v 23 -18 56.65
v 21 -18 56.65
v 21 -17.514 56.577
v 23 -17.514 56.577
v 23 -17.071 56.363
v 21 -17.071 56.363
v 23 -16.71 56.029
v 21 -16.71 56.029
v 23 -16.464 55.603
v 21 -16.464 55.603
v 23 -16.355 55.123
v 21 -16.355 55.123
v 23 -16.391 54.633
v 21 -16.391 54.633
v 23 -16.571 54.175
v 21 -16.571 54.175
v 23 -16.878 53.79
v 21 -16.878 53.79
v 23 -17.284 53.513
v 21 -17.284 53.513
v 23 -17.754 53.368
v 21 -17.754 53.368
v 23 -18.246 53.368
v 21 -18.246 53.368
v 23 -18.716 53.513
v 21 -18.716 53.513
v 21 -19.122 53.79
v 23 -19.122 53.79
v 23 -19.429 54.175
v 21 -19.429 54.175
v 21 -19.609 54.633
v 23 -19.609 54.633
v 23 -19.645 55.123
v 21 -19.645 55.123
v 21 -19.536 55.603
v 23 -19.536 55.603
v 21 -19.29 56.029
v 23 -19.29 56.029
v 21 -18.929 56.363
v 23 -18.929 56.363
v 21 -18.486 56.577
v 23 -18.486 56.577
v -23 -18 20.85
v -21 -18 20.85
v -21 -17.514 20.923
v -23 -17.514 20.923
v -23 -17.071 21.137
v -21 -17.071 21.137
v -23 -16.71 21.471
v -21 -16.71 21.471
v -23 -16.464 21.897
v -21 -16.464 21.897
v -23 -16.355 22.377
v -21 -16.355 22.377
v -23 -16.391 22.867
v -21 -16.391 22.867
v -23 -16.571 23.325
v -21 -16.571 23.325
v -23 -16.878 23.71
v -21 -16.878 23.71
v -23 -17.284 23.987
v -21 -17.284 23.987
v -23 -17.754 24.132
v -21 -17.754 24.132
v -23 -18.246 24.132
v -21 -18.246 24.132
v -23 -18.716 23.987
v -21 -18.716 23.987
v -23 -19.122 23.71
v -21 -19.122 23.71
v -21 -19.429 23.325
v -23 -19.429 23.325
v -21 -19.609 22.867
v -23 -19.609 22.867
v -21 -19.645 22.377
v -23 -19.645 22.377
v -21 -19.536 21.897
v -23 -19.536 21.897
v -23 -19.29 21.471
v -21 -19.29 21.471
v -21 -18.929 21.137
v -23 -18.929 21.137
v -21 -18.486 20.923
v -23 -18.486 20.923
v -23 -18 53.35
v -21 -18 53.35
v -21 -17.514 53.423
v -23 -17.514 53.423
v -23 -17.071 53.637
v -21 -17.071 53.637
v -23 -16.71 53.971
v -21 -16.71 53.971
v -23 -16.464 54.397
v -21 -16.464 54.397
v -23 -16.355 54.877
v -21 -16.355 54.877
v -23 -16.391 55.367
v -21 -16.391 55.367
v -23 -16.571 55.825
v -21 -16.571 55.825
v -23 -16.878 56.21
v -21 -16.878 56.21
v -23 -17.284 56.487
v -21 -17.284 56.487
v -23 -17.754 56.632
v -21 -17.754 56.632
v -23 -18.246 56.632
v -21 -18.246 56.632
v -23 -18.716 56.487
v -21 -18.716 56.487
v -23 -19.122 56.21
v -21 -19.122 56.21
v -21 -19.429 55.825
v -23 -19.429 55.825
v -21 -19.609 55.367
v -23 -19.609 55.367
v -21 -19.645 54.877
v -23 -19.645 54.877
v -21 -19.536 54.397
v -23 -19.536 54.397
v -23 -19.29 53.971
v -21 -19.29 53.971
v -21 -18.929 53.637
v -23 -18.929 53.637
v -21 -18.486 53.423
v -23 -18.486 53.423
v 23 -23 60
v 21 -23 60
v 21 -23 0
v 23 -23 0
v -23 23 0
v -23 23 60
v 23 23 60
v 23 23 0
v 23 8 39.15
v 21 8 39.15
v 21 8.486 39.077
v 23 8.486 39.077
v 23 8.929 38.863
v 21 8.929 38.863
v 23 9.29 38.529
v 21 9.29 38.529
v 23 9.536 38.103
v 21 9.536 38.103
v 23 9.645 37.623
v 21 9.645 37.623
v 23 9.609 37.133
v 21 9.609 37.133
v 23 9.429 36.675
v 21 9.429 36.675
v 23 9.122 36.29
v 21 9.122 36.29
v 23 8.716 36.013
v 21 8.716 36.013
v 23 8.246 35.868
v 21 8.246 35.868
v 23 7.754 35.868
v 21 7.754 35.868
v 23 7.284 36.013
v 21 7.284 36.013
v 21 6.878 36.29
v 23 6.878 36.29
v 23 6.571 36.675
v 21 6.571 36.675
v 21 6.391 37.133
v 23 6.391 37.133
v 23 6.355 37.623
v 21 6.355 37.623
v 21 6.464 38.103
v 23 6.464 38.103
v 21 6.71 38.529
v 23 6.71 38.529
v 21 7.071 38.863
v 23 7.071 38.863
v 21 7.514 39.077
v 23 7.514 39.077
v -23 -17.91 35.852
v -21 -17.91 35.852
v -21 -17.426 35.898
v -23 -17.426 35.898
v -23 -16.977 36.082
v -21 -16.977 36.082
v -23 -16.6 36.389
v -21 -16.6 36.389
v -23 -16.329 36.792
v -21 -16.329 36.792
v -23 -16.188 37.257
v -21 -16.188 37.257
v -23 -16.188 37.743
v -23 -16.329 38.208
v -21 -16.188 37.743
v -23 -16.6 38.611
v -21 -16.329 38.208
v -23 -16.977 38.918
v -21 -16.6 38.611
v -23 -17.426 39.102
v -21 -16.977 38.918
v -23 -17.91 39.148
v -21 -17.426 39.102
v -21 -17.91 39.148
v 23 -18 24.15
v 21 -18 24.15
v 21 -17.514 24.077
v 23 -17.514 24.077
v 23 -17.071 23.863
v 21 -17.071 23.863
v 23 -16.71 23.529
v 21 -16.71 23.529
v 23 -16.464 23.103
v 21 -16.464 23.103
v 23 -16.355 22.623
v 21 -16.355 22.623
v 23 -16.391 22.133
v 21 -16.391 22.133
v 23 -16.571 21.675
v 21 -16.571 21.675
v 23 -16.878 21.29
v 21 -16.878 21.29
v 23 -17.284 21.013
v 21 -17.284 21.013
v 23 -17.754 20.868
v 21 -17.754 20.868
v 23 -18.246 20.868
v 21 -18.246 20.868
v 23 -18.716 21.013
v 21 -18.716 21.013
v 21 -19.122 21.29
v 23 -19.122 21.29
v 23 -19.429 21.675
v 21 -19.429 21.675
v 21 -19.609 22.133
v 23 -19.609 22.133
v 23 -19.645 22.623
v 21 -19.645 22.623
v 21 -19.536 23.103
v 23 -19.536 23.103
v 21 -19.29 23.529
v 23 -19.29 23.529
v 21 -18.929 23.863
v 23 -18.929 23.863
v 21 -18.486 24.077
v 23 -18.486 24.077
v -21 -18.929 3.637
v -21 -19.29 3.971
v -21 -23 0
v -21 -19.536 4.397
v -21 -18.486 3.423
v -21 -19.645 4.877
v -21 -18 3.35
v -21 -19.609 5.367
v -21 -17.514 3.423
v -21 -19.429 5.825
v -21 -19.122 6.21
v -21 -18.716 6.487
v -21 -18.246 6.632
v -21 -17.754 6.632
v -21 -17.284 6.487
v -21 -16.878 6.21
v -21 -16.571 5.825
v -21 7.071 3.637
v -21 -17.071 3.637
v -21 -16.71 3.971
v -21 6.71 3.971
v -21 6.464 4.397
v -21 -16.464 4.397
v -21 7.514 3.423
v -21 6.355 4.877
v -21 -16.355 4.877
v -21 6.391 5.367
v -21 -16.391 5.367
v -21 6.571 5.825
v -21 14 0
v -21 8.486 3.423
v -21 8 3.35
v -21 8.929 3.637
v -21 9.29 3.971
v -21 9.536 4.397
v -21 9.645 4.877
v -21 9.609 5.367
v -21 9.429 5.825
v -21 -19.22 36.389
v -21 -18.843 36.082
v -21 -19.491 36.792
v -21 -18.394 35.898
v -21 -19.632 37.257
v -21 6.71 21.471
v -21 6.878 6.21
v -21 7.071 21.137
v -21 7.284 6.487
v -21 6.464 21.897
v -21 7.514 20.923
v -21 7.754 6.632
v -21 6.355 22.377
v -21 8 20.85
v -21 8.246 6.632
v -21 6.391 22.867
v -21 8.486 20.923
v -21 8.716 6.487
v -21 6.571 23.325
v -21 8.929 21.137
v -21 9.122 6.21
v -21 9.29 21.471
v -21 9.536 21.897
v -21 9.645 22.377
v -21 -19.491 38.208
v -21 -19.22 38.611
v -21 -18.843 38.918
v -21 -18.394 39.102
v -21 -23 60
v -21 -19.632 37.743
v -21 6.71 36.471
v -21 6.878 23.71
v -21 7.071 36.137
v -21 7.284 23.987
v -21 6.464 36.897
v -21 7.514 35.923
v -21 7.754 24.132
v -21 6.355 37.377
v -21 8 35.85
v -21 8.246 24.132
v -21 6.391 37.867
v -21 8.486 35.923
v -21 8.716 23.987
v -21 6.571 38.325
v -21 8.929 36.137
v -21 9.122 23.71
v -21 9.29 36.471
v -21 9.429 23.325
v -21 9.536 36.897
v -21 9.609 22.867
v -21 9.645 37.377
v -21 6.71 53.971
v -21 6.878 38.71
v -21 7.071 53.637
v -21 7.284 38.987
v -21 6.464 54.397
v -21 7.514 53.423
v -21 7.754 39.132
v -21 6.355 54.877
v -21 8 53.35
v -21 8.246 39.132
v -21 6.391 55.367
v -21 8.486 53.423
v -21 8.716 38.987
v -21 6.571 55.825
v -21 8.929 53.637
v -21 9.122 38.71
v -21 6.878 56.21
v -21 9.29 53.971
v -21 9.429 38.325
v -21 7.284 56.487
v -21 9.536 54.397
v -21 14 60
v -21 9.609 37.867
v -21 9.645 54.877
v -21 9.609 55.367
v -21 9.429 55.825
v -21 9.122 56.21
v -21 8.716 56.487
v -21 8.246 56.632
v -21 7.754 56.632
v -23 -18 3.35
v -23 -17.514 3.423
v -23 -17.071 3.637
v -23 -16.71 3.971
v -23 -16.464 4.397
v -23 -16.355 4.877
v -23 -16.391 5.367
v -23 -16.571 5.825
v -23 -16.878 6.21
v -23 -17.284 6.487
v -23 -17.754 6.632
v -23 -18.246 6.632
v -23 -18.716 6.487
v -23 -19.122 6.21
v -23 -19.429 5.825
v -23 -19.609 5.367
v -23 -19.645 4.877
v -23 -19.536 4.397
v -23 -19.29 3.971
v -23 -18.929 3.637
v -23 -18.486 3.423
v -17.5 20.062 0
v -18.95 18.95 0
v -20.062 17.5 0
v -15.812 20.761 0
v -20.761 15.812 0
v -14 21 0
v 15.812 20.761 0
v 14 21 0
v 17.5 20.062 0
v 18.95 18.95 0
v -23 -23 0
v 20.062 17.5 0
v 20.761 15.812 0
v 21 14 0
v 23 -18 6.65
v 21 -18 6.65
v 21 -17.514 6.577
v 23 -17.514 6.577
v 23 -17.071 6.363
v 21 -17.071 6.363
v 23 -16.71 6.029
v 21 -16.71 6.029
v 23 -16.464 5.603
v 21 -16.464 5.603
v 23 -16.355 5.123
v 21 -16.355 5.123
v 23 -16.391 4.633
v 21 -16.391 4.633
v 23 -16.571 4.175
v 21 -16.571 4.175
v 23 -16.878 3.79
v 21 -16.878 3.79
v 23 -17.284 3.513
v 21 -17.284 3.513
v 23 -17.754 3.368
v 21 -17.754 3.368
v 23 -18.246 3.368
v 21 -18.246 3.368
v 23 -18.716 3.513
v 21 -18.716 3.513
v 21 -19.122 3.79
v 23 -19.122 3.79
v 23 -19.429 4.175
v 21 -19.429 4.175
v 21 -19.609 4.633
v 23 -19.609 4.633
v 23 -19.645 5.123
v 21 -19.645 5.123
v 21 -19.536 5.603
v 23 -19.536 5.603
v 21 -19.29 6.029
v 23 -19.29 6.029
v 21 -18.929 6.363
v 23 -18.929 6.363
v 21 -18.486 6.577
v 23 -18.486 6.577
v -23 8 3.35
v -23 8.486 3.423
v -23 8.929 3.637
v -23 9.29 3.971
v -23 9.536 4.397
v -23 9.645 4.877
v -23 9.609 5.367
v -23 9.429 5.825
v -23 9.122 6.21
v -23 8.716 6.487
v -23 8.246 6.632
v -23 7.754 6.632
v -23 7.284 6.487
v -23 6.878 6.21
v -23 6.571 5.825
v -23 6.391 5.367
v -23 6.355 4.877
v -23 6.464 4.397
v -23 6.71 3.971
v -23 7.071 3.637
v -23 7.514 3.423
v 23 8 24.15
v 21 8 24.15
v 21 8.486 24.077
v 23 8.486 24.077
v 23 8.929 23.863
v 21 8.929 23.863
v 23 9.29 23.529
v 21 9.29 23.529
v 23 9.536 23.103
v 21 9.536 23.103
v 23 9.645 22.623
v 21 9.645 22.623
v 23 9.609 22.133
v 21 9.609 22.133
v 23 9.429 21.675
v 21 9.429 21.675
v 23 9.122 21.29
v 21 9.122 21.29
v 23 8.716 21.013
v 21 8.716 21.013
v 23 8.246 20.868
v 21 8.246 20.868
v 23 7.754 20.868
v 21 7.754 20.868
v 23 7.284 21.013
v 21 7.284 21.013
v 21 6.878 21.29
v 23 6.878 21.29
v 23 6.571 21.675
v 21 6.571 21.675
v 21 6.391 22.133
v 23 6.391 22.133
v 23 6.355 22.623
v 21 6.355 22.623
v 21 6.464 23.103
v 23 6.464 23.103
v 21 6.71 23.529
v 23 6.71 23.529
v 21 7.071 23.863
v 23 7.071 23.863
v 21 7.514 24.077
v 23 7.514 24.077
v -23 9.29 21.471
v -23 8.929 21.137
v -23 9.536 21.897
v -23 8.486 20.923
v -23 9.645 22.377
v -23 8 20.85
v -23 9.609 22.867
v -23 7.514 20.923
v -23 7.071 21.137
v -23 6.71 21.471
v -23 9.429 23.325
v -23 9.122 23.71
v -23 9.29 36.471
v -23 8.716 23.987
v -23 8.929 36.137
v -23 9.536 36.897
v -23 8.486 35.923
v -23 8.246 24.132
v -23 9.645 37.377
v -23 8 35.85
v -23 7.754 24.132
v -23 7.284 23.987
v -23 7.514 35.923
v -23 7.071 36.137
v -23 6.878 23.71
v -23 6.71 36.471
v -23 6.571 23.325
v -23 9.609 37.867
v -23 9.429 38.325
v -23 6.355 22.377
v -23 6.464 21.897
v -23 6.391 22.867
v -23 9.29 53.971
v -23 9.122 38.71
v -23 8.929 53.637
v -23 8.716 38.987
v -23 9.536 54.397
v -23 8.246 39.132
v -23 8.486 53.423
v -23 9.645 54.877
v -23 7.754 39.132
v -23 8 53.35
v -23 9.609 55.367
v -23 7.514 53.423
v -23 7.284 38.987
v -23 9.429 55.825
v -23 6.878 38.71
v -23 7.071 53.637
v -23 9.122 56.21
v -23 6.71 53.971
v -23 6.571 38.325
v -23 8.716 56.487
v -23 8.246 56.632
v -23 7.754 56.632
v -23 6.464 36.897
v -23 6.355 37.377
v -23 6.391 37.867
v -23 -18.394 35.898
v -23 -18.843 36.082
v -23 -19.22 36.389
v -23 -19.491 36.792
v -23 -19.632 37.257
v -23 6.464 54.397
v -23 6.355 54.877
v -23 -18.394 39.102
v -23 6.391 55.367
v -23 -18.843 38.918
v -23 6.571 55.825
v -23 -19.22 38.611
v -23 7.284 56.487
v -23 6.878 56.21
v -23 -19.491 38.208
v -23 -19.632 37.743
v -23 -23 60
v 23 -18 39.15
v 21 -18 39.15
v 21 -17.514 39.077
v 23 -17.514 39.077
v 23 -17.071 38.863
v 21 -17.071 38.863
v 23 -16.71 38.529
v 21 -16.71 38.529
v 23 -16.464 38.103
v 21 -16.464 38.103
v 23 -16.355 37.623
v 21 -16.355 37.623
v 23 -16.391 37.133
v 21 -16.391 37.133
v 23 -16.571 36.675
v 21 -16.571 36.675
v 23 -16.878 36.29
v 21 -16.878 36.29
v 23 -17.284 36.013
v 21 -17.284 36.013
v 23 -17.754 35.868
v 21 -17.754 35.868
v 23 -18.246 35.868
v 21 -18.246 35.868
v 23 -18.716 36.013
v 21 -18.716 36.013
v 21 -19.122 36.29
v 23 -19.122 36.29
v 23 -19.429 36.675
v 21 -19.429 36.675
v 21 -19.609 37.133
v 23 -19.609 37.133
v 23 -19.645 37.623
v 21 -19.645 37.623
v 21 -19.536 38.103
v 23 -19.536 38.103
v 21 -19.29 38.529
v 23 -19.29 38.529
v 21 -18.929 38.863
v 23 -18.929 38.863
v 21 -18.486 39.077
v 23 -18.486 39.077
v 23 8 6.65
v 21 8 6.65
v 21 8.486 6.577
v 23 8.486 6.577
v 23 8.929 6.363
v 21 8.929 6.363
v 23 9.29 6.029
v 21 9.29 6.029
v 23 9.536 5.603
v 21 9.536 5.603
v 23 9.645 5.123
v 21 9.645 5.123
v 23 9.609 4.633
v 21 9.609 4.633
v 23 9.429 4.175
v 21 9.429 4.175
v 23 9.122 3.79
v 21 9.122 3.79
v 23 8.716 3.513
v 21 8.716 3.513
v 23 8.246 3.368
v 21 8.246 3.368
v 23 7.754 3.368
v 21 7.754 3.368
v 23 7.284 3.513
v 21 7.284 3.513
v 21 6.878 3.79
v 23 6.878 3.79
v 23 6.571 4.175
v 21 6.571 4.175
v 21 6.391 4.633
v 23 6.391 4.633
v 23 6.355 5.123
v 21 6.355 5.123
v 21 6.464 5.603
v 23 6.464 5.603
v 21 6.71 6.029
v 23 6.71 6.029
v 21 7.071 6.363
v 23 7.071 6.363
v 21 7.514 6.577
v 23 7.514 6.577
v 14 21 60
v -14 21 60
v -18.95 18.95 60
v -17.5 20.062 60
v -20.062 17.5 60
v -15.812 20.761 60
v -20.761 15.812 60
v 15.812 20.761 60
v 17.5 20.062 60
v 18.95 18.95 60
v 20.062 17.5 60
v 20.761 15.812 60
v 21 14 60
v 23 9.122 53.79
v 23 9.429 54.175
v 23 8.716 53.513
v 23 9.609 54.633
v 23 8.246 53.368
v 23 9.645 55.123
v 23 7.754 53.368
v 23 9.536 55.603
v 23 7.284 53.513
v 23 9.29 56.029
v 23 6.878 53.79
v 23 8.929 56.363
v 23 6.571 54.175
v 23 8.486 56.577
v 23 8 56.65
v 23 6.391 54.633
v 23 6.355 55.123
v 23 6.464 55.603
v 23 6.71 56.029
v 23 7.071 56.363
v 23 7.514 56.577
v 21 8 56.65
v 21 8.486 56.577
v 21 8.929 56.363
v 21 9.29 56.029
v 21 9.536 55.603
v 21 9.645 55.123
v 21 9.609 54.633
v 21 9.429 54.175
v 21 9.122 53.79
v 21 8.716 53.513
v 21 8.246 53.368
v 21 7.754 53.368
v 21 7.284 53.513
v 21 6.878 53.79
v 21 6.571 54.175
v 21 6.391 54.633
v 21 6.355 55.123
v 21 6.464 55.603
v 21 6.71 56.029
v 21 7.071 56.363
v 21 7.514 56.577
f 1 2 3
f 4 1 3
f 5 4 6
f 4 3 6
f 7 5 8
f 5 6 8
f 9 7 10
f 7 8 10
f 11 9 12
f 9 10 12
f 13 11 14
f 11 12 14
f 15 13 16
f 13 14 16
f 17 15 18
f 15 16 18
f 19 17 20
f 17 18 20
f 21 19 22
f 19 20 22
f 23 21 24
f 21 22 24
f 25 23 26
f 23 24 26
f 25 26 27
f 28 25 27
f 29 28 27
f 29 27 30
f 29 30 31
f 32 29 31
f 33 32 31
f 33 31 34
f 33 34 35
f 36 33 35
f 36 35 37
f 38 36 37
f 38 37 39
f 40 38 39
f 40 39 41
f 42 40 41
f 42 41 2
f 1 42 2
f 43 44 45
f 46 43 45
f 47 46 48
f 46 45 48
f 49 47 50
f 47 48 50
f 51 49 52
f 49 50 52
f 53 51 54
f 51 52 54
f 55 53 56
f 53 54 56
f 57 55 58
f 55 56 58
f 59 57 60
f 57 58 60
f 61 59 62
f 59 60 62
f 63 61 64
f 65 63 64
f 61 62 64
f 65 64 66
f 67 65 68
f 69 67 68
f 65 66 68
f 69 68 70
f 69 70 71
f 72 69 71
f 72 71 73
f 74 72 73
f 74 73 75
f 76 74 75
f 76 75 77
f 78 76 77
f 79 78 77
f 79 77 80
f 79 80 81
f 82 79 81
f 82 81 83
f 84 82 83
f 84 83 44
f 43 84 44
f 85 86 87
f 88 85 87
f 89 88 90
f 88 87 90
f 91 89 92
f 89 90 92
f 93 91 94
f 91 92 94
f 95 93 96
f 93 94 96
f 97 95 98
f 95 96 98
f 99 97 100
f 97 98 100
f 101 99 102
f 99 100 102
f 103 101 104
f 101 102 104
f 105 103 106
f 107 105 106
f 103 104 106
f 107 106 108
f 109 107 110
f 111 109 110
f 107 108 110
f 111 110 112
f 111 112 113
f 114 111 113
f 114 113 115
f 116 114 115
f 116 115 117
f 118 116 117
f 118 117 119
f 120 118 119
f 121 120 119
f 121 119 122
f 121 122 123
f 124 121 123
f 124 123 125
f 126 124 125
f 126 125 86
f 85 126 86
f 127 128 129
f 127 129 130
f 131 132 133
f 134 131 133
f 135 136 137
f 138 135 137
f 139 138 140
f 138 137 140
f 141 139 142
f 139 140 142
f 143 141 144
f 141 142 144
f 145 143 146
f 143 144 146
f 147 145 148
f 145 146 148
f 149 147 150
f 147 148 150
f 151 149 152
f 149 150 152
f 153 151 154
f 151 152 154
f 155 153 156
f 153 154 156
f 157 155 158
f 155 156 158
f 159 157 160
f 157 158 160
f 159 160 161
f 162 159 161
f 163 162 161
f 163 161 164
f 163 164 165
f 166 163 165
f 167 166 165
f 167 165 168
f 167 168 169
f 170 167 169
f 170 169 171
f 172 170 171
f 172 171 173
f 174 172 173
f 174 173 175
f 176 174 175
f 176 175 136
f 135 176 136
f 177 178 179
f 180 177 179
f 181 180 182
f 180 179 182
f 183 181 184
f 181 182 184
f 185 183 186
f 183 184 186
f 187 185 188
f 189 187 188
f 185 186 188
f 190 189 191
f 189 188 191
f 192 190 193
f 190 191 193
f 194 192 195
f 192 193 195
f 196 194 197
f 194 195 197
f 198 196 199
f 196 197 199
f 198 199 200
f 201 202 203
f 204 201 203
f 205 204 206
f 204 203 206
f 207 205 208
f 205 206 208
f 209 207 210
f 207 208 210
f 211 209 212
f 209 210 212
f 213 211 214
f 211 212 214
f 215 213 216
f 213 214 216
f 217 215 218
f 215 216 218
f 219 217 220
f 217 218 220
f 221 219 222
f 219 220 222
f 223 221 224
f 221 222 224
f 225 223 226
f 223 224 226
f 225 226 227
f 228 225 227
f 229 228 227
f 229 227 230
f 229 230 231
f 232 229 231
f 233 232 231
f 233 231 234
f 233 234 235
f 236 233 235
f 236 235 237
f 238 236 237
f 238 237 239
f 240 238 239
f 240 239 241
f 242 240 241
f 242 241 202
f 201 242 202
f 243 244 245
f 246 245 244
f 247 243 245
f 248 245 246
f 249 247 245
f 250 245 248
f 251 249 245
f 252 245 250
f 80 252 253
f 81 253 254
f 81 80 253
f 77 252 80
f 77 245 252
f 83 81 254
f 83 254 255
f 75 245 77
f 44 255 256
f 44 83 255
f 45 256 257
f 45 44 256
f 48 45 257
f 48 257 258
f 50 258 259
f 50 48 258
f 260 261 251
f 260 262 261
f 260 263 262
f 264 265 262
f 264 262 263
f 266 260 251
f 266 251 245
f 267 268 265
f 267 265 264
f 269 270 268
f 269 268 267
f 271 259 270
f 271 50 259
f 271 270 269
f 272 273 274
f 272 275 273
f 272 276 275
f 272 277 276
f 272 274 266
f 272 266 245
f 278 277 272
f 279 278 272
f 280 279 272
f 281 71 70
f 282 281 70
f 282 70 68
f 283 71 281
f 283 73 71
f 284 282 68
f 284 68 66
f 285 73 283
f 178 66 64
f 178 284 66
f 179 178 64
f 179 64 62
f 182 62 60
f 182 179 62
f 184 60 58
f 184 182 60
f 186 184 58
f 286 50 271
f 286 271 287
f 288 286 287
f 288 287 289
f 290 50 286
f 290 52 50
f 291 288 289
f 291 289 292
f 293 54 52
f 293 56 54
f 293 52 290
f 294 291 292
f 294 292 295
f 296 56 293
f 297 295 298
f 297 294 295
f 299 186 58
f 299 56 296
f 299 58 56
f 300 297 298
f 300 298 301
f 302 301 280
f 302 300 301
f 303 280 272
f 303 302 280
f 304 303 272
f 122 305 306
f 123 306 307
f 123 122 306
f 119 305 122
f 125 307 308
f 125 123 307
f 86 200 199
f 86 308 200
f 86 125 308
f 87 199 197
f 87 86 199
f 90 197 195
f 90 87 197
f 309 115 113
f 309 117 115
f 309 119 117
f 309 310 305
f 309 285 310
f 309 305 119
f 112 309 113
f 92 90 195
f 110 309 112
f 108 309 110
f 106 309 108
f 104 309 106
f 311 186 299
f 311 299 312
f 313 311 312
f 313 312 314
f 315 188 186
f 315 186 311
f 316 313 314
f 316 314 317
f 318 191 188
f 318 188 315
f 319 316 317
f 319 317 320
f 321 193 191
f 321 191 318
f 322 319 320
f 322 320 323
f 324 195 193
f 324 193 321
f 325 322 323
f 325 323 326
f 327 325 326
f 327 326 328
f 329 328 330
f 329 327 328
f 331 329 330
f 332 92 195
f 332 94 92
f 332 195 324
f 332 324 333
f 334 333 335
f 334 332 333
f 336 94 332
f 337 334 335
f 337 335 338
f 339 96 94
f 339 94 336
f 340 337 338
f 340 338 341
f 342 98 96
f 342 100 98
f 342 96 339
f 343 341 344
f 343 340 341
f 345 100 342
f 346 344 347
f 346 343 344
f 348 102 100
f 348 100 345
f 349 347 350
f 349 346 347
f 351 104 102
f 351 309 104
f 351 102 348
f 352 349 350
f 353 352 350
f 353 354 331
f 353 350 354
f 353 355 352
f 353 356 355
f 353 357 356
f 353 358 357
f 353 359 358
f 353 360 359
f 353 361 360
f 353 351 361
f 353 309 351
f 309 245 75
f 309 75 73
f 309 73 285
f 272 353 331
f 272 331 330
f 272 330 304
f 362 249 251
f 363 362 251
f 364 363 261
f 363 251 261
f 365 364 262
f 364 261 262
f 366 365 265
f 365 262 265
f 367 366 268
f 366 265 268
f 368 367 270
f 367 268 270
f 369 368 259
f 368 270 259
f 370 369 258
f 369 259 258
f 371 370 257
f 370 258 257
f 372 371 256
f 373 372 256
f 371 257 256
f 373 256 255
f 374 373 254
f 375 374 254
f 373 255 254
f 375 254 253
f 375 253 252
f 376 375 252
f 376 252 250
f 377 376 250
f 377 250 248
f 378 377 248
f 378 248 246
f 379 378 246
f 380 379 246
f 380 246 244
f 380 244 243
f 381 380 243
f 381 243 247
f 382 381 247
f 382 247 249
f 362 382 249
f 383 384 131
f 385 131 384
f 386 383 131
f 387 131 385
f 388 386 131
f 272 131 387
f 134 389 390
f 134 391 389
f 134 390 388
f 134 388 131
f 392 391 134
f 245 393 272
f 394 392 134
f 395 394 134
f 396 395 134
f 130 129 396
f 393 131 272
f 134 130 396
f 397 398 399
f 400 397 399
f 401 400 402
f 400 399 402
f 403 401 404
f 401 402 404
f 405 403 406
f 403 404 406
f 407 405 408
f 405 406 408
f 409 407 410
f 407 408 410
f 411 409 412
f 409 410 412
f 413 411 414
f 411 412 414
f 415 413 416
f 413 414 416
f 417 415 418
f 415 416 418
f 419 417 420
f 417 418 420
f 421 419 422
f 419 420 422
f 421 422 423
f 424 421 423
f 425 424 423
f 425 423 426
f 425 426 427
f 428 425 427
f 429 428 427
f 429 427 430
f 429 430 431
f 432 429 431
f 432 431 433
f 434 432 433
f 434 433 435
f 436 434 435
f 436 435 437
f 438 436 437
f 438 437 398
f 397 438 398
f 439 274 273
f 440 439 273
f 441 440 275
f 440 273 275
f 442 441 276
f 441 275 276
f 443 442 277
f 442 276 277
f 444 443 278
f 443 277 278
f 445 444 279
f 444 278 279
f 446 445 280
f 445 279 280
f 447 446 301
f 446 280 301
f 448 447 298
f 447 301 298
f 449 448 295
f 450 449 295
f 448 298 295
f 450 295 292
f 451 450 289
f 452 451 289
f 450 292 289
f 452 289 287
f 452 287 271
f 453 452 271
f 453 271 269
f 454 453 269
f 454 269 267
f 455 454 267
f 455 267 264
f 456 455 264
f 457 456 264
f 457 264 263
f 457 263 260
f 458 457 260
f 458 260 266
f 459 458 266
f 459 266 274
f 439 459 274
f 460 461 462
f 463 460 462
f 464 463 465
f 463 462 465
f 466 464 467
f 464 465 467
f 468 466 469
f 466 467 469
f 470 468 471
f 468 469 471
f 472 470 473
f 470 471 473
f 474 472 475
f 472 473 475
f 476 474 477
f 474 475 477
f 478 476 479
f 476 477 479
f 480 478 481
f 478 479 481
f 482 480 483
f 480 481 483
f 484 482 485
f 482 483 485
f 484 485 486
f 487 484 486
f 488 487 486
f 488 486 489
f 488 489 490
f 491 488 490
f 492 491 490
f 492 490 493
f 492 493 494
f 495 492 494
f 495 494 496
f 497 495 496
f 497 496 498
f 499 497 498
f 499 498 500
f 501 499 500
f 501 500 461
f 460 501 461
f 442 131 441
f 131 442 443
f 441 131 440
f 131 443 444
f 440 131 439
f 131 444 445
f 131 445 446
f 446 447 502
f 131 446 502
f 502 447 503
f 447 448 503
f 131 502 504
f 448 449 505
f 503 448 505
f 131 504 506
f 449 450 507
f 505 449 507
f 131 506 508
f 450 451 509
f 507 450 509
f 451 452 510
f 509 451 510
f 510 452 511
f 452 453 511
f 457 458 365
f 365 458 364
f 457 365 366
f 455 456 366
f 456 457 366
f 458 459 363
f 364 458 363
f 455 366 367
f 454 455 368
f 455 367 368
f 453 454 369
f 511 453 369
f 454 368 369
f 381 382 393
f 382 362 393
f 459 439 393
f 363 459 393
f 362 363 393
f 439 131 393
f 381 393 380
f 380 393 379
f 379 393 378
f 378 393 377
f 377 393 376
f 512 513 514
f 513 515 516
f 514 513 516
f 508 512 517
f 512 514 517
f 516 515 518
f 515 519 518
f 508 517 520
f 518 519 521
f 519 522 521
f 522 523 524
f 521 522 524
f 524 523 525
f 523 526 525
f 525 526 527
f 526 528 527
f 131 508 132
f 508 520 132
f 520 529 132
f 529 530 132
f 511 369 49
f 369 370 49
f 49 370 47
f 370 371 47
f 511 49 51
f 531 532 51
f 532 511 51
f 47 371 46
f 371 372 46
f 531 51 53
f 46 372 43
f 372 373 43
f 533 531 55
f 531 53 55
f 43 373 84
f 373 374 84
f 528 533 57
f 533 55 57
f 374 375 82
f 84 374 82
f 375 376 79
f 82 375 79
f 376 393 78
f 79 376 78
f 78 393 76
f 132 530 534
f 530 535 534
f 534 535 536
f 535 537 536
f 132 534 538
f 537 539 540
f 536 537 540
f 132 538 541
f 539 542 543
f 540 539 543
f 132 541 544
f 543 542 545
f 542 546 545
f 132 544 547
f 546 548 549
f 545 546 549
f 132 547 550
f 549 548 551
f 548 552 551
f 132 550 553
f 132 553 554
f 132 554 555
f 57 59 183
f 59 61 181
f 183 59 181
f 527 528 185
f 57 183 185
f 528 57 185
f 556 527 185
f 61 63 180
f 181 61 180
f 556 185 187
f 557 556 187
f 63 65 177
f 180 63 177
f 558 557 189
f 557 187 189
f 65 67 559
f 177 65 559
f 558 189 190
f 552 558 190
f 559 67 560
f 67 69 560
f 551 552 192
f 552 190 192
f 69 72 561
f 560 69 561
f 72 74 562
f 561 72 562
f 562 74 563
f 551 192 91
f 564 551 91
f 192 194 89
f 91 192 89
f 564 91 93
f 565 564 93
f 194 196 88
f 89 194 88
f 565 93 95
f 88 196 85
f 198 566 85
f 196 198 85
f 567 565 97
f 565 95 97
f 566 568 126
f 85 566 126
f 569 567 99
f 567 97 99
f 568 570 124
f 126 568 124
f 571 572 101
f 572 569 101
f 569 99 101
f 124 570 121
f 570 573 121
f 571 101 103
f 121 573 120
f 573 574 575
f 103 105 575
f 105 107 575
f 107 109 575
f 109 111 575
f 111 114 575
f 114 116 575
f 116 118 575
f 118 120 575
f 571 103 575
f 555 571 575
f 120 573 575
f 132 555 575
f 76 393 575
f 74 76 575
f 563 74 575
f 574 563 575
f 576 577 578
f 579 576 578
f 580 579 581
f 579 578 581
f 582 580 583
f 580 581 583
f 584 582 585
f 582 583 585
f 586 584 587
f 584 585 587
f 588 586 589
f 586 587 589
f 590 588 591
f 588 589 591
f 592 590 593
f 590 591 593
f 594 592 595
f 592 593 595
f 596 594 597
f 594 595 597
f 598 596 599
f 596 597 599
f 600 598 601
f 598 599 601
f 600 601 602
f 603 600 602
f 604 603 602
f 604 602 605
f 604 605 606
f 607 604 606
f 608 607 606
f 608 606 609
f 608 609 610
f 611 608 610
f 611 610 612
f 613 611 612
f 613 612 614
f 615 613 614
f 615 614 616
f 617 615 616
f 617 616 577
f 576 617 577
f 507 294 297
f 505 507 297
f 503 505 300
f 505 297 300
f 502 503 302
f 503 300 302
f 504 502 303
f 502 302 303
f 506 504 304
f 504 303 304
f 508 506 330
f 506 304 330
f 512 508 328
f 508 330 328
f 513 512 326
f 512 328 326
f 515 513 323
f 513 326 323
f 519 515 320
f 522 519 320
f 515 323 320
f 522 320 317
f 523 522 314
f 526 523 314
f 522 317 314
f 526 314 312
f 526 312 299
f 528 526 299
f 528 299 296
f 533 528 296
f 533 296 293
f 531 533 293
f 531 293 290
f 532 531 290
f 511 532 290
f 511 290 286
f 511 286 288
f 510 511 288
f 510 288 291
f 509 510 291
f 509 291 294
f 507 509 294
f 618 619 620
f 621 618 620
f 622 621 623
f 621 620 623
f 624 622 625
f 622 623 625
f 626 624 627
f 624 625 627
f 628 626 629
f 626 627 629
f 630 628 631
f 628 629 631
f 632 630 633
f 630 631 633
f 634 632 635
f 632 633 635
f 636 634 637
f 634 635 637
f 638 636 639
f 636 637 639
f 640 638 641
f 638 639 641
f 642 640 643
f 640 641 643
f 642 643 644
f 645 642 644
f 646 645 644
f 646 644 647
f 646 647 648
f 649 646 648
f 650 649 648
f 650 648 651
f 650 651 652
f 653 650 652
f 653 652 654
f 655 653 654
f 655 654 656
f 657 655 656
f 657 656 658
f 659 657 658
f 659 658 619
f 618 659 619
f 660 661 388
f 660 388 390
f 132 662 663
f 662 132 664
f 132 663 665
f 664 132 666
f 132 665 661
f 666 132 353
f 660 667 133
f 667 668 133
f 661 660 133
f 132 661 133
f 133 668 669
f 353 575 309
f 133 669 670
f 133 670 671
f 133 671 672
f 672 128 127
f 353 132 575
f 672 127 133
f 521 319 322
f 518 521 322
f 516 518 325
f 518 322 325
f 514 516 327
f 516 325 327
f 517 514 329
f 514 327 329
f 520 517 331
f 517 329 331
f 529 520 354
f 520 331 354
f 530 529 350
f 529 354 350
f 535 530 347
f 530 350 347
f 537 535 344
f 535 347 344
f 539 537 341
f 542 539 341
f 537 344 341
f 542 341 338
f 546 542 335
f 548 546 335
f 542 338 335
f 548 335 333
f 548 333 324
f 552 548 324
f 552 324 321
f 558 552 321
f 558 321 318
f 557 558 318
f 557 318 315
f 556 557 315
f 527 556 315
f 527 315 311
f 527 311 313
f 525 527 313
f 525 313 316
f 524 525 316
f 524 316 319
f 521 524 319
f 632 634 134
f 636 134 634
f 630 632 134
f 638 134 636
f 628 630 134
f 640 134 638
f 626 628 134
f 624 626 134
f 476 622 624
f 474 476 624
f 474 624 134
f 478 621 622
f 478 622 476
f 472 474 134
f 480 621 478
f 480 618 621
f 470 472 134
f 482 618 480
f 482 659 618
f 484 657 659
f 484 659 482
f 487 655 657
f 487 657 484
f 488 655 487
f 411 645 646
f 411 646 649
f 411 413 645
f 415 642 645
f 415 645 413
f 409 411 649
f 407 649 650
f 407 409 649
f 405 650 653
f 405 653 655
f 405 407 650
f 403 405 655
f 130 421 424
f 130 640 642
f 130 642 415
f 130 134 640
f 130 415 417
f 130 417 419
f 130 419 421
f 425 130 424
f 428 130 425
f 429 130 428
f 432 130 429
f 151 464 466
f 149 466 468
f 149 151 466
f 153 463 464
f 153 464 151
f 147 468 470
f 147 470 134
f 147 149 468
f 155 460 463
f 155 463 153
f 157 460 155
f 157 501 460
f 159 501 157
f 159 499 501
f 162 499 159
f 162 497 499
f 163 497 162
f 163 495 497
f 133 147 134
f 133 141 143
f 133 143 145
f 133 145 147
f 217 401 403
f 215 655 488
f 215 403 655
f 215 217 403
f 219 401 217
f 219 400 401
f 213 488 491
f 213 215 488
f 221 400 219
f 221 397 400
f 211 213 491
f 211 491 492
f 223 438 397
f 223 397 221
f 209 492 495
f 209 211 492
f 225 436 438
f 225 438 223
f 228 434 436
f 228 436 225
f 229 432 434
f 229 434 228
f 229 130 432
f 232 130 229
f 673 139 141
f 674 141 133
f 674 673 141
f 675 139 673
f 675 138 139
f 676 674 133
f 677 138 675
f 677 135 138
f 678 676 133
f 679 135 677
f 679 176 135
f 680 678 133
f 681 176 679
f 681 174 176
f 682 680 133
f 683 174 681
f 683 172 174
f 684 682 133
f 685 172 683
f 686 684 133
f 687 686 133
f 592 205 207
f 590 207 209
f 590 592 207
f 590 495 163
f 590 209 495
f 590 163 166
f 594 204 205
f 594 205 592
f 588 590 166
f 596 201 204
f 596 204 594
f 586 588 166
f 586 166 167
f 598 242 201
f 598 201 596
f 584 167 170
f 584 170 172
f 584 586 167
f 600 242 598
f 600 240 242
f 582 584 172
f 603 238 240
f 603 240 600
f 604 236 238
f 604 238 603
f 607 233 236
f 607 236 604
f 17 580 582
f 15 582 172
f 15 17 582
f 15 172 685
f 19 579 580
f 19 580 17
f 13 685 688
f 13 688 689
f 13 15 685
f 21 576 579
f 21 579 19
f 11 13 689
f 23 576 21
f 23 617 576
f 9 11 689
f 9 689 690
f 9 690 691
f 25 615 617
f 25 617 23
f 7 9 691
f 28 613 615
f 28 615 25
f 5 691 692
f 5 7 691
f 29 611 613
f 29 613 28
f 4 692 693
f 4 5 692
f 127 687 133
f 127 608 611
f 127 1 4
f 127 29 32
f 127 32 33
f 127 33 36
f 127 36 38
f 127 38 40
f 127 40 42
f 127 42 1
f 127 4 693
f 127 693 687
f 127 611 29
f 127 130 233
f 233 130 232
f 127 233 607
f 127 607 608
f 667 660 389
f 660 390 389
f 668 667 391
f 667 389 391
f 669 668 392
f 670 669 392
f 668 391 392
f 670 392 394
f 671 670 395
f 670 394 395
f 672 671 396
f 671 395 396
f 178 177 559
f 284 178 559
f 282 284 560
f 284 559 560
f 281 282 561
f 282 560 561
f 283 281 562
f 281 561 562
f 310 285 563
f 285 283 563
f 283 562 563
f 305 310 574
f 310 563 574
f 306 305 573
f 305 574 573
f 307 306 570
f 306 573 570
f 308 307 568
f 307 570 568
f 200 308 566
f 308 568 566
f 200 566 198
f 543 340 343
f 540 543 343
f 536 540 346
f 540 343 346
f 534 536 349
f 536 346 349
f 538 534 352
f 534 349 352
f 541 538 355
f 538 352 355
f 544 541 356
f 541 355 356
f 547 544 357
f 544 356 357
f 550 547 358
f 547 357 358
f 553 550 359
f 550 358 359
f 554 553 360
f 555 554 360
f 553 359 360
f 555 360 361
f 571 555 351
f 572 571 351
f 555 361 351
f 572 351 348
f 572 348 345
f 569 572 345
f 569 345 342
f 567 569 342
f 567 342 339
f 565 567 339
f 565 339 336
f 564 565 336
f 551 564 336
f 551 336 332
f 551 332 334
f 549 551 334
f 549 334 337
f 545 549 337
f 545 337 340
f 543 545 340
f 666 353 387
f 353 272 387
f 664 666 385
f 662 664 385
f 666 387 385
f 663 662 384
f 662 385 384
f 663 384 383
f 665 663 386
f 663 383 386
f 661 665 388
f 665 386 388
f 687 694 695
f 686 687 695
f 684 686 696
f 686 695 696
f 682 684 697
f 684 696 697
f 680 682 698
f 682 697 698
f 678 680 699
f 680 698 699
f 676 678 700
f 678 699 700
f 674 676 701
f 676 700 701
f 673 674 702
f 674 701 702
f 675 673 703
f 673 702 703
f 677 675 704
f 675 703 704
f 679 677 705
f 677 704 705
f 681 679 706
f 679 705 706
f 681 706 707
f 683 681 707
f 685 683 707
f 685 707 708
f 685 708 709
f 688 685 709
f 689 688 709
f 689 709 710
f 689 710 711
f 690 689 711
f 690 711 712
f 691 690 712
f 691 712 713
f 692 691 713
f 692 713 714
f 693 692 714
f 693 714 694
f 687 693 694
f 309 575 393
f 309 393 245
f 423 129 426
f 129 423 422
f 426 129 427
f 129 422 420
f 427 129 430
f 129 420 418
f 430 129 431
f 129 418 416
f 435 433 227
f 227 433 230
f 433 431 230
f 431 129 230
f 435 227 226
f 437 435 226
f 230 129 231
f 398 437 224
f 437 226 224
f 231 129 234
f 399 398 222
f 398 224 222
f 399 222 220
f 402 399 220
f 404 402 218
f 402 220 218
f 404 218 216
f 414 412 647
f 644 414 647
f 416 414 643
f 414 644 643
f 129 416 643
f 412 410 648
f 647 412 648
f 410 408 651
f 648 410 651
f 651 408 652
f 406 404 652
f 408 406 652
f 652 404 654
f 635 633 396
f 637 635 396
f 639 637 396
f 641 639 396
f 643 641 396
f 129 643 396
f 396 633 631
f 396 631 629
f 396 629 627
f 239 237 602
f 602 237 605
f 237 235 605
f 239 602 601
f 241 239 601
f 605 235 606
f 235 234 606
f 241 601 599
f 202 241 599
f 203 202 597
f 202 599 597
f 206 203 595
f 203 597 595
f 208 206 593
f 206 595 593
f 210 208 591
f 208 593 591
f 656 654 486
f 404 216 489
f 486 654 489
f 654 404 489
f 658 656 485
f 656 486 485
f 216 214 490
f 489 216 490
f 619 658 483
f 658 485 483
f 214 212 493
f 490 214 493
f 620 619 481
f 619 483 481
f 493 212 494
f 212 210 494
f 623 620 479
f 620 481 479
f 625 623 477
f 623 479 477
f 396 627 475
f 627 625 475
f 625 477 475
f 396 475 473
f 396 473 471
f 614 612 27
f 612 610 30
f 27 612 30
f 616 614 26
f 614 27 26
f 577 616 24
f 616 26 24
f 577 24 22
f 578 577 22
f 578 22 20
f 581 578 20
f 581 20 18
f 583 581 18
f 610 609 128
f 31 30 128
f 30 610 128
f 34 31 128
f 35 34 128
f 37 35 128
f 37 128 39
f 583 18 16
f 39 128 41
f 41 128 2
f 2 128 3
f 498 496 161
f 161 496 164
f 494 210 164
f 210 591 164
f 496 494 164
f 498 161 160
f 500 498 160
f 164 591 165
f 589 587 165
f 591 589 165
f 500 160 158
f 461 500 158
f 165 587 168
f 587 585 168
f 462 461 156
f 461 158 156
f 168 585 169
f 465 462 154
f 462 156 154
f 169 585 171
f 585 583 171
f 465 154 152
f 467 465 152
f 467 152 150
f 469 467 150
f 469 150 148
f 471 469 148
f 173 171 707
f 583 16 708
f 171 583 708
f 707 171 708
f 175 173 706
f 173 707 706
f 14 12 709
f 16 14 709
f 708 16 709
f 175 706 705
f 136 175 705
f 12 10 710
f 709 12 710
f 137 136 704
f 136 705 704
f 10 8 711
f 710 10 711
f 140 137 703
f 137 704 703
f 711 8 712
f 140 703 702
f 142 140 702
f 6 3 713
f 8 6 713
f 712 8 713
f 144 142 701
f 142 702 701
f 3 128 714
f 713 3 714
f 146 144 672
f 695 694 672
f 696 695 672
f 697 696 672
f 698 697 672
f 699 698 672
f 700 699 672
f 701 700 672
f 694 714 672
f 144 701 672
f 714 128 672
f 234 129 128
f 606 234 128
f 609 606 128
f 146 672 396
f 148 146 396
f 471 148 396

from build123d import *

# Parameters (mm, degrees)
SKETCH_1_W                  = 46
SKETCH_1_H                  = 60
EXTRUDE_1_DEPTH             = 46
SKETCH_2_W                  = 42
SKETCH_2_H                  = 44
CUT_EXTRUDE_1_DEPTH         = 69.249542123
HOLE_WIZARD_3_3_3_3_1_D     = 3.3
HOLE_WIZARD_3_3_3_3_1_DEPTH = 2
HOLE_WIZARD_3_3_3_3_2_D     = 3.3
HOLE_WIZARD_3_3_3_3_2_DEPTH = 46
FILLET_1_R                  = 7


with BuildPart() as part:
    # 草图1 → 凸台-拉伸1 (new body)
    with BuildSketch(Plane.XZ.offset(23)):
        with Locations((0, 30)):
            Rectangle(SKETCH_1_W, SKETCH_1_H)
    extrude(amount=-EXTRUDE_1_DEPTH)

    # 草图2 → 切除-拉伸1 (cut, through all)
    with BuildSketch(Plane.XY.offset(60)):
        with Locations((0, -1)):
            Rectangle(SKETCH_2_W, SKETCH_2_H)
    extrude(amount=-CUT_EXTRUDE_1_DEPTH, mode=Mode.SUBTRACT)

    # Ø3.3 (3.3) 直径孔1
    with Locations(Plane.ZY.offset(23)):
        with Locations((55, -18), (22.5, -18), (22.5, 8), (55, 8), (5, 8), (37.5, 8), (37.5, -17.819824414), (5, -18)):
            Hole(HOLE_WIZARD_3_3_3_3_1_D / 2, depth=HOLE_WIZARD_3_3_3_3_1_DEPTH)

    # Ø3.3 (3.3) 直径孔2
    with Locations(Plane(origin=(23, 0, 0), x_dir=(0, 0, -1), z_dir=(1, 0, 0))):
        with Locations((-55, 8), (-22.5, 8), (-22.5, -18), (-55, -18), (-5, -18), (-5, 8), (-37.5, 8), (-37.5, -18)):
            Hole(HOLE_WIZARD_3_3_3_3_2_D / 2, depth=HOLE_WIZARD_3_3_3_3_2_DEPTH)

    # 圆角1
    fillet_1_edges = [part.edges().sort_by_distance(p)[0] for p in [
        (-21, 21, 30),
        (21, 21, 30),
    ]]
    fillet(fillet_1_edges, radius=FILLET_1_R)


solid = part.part
